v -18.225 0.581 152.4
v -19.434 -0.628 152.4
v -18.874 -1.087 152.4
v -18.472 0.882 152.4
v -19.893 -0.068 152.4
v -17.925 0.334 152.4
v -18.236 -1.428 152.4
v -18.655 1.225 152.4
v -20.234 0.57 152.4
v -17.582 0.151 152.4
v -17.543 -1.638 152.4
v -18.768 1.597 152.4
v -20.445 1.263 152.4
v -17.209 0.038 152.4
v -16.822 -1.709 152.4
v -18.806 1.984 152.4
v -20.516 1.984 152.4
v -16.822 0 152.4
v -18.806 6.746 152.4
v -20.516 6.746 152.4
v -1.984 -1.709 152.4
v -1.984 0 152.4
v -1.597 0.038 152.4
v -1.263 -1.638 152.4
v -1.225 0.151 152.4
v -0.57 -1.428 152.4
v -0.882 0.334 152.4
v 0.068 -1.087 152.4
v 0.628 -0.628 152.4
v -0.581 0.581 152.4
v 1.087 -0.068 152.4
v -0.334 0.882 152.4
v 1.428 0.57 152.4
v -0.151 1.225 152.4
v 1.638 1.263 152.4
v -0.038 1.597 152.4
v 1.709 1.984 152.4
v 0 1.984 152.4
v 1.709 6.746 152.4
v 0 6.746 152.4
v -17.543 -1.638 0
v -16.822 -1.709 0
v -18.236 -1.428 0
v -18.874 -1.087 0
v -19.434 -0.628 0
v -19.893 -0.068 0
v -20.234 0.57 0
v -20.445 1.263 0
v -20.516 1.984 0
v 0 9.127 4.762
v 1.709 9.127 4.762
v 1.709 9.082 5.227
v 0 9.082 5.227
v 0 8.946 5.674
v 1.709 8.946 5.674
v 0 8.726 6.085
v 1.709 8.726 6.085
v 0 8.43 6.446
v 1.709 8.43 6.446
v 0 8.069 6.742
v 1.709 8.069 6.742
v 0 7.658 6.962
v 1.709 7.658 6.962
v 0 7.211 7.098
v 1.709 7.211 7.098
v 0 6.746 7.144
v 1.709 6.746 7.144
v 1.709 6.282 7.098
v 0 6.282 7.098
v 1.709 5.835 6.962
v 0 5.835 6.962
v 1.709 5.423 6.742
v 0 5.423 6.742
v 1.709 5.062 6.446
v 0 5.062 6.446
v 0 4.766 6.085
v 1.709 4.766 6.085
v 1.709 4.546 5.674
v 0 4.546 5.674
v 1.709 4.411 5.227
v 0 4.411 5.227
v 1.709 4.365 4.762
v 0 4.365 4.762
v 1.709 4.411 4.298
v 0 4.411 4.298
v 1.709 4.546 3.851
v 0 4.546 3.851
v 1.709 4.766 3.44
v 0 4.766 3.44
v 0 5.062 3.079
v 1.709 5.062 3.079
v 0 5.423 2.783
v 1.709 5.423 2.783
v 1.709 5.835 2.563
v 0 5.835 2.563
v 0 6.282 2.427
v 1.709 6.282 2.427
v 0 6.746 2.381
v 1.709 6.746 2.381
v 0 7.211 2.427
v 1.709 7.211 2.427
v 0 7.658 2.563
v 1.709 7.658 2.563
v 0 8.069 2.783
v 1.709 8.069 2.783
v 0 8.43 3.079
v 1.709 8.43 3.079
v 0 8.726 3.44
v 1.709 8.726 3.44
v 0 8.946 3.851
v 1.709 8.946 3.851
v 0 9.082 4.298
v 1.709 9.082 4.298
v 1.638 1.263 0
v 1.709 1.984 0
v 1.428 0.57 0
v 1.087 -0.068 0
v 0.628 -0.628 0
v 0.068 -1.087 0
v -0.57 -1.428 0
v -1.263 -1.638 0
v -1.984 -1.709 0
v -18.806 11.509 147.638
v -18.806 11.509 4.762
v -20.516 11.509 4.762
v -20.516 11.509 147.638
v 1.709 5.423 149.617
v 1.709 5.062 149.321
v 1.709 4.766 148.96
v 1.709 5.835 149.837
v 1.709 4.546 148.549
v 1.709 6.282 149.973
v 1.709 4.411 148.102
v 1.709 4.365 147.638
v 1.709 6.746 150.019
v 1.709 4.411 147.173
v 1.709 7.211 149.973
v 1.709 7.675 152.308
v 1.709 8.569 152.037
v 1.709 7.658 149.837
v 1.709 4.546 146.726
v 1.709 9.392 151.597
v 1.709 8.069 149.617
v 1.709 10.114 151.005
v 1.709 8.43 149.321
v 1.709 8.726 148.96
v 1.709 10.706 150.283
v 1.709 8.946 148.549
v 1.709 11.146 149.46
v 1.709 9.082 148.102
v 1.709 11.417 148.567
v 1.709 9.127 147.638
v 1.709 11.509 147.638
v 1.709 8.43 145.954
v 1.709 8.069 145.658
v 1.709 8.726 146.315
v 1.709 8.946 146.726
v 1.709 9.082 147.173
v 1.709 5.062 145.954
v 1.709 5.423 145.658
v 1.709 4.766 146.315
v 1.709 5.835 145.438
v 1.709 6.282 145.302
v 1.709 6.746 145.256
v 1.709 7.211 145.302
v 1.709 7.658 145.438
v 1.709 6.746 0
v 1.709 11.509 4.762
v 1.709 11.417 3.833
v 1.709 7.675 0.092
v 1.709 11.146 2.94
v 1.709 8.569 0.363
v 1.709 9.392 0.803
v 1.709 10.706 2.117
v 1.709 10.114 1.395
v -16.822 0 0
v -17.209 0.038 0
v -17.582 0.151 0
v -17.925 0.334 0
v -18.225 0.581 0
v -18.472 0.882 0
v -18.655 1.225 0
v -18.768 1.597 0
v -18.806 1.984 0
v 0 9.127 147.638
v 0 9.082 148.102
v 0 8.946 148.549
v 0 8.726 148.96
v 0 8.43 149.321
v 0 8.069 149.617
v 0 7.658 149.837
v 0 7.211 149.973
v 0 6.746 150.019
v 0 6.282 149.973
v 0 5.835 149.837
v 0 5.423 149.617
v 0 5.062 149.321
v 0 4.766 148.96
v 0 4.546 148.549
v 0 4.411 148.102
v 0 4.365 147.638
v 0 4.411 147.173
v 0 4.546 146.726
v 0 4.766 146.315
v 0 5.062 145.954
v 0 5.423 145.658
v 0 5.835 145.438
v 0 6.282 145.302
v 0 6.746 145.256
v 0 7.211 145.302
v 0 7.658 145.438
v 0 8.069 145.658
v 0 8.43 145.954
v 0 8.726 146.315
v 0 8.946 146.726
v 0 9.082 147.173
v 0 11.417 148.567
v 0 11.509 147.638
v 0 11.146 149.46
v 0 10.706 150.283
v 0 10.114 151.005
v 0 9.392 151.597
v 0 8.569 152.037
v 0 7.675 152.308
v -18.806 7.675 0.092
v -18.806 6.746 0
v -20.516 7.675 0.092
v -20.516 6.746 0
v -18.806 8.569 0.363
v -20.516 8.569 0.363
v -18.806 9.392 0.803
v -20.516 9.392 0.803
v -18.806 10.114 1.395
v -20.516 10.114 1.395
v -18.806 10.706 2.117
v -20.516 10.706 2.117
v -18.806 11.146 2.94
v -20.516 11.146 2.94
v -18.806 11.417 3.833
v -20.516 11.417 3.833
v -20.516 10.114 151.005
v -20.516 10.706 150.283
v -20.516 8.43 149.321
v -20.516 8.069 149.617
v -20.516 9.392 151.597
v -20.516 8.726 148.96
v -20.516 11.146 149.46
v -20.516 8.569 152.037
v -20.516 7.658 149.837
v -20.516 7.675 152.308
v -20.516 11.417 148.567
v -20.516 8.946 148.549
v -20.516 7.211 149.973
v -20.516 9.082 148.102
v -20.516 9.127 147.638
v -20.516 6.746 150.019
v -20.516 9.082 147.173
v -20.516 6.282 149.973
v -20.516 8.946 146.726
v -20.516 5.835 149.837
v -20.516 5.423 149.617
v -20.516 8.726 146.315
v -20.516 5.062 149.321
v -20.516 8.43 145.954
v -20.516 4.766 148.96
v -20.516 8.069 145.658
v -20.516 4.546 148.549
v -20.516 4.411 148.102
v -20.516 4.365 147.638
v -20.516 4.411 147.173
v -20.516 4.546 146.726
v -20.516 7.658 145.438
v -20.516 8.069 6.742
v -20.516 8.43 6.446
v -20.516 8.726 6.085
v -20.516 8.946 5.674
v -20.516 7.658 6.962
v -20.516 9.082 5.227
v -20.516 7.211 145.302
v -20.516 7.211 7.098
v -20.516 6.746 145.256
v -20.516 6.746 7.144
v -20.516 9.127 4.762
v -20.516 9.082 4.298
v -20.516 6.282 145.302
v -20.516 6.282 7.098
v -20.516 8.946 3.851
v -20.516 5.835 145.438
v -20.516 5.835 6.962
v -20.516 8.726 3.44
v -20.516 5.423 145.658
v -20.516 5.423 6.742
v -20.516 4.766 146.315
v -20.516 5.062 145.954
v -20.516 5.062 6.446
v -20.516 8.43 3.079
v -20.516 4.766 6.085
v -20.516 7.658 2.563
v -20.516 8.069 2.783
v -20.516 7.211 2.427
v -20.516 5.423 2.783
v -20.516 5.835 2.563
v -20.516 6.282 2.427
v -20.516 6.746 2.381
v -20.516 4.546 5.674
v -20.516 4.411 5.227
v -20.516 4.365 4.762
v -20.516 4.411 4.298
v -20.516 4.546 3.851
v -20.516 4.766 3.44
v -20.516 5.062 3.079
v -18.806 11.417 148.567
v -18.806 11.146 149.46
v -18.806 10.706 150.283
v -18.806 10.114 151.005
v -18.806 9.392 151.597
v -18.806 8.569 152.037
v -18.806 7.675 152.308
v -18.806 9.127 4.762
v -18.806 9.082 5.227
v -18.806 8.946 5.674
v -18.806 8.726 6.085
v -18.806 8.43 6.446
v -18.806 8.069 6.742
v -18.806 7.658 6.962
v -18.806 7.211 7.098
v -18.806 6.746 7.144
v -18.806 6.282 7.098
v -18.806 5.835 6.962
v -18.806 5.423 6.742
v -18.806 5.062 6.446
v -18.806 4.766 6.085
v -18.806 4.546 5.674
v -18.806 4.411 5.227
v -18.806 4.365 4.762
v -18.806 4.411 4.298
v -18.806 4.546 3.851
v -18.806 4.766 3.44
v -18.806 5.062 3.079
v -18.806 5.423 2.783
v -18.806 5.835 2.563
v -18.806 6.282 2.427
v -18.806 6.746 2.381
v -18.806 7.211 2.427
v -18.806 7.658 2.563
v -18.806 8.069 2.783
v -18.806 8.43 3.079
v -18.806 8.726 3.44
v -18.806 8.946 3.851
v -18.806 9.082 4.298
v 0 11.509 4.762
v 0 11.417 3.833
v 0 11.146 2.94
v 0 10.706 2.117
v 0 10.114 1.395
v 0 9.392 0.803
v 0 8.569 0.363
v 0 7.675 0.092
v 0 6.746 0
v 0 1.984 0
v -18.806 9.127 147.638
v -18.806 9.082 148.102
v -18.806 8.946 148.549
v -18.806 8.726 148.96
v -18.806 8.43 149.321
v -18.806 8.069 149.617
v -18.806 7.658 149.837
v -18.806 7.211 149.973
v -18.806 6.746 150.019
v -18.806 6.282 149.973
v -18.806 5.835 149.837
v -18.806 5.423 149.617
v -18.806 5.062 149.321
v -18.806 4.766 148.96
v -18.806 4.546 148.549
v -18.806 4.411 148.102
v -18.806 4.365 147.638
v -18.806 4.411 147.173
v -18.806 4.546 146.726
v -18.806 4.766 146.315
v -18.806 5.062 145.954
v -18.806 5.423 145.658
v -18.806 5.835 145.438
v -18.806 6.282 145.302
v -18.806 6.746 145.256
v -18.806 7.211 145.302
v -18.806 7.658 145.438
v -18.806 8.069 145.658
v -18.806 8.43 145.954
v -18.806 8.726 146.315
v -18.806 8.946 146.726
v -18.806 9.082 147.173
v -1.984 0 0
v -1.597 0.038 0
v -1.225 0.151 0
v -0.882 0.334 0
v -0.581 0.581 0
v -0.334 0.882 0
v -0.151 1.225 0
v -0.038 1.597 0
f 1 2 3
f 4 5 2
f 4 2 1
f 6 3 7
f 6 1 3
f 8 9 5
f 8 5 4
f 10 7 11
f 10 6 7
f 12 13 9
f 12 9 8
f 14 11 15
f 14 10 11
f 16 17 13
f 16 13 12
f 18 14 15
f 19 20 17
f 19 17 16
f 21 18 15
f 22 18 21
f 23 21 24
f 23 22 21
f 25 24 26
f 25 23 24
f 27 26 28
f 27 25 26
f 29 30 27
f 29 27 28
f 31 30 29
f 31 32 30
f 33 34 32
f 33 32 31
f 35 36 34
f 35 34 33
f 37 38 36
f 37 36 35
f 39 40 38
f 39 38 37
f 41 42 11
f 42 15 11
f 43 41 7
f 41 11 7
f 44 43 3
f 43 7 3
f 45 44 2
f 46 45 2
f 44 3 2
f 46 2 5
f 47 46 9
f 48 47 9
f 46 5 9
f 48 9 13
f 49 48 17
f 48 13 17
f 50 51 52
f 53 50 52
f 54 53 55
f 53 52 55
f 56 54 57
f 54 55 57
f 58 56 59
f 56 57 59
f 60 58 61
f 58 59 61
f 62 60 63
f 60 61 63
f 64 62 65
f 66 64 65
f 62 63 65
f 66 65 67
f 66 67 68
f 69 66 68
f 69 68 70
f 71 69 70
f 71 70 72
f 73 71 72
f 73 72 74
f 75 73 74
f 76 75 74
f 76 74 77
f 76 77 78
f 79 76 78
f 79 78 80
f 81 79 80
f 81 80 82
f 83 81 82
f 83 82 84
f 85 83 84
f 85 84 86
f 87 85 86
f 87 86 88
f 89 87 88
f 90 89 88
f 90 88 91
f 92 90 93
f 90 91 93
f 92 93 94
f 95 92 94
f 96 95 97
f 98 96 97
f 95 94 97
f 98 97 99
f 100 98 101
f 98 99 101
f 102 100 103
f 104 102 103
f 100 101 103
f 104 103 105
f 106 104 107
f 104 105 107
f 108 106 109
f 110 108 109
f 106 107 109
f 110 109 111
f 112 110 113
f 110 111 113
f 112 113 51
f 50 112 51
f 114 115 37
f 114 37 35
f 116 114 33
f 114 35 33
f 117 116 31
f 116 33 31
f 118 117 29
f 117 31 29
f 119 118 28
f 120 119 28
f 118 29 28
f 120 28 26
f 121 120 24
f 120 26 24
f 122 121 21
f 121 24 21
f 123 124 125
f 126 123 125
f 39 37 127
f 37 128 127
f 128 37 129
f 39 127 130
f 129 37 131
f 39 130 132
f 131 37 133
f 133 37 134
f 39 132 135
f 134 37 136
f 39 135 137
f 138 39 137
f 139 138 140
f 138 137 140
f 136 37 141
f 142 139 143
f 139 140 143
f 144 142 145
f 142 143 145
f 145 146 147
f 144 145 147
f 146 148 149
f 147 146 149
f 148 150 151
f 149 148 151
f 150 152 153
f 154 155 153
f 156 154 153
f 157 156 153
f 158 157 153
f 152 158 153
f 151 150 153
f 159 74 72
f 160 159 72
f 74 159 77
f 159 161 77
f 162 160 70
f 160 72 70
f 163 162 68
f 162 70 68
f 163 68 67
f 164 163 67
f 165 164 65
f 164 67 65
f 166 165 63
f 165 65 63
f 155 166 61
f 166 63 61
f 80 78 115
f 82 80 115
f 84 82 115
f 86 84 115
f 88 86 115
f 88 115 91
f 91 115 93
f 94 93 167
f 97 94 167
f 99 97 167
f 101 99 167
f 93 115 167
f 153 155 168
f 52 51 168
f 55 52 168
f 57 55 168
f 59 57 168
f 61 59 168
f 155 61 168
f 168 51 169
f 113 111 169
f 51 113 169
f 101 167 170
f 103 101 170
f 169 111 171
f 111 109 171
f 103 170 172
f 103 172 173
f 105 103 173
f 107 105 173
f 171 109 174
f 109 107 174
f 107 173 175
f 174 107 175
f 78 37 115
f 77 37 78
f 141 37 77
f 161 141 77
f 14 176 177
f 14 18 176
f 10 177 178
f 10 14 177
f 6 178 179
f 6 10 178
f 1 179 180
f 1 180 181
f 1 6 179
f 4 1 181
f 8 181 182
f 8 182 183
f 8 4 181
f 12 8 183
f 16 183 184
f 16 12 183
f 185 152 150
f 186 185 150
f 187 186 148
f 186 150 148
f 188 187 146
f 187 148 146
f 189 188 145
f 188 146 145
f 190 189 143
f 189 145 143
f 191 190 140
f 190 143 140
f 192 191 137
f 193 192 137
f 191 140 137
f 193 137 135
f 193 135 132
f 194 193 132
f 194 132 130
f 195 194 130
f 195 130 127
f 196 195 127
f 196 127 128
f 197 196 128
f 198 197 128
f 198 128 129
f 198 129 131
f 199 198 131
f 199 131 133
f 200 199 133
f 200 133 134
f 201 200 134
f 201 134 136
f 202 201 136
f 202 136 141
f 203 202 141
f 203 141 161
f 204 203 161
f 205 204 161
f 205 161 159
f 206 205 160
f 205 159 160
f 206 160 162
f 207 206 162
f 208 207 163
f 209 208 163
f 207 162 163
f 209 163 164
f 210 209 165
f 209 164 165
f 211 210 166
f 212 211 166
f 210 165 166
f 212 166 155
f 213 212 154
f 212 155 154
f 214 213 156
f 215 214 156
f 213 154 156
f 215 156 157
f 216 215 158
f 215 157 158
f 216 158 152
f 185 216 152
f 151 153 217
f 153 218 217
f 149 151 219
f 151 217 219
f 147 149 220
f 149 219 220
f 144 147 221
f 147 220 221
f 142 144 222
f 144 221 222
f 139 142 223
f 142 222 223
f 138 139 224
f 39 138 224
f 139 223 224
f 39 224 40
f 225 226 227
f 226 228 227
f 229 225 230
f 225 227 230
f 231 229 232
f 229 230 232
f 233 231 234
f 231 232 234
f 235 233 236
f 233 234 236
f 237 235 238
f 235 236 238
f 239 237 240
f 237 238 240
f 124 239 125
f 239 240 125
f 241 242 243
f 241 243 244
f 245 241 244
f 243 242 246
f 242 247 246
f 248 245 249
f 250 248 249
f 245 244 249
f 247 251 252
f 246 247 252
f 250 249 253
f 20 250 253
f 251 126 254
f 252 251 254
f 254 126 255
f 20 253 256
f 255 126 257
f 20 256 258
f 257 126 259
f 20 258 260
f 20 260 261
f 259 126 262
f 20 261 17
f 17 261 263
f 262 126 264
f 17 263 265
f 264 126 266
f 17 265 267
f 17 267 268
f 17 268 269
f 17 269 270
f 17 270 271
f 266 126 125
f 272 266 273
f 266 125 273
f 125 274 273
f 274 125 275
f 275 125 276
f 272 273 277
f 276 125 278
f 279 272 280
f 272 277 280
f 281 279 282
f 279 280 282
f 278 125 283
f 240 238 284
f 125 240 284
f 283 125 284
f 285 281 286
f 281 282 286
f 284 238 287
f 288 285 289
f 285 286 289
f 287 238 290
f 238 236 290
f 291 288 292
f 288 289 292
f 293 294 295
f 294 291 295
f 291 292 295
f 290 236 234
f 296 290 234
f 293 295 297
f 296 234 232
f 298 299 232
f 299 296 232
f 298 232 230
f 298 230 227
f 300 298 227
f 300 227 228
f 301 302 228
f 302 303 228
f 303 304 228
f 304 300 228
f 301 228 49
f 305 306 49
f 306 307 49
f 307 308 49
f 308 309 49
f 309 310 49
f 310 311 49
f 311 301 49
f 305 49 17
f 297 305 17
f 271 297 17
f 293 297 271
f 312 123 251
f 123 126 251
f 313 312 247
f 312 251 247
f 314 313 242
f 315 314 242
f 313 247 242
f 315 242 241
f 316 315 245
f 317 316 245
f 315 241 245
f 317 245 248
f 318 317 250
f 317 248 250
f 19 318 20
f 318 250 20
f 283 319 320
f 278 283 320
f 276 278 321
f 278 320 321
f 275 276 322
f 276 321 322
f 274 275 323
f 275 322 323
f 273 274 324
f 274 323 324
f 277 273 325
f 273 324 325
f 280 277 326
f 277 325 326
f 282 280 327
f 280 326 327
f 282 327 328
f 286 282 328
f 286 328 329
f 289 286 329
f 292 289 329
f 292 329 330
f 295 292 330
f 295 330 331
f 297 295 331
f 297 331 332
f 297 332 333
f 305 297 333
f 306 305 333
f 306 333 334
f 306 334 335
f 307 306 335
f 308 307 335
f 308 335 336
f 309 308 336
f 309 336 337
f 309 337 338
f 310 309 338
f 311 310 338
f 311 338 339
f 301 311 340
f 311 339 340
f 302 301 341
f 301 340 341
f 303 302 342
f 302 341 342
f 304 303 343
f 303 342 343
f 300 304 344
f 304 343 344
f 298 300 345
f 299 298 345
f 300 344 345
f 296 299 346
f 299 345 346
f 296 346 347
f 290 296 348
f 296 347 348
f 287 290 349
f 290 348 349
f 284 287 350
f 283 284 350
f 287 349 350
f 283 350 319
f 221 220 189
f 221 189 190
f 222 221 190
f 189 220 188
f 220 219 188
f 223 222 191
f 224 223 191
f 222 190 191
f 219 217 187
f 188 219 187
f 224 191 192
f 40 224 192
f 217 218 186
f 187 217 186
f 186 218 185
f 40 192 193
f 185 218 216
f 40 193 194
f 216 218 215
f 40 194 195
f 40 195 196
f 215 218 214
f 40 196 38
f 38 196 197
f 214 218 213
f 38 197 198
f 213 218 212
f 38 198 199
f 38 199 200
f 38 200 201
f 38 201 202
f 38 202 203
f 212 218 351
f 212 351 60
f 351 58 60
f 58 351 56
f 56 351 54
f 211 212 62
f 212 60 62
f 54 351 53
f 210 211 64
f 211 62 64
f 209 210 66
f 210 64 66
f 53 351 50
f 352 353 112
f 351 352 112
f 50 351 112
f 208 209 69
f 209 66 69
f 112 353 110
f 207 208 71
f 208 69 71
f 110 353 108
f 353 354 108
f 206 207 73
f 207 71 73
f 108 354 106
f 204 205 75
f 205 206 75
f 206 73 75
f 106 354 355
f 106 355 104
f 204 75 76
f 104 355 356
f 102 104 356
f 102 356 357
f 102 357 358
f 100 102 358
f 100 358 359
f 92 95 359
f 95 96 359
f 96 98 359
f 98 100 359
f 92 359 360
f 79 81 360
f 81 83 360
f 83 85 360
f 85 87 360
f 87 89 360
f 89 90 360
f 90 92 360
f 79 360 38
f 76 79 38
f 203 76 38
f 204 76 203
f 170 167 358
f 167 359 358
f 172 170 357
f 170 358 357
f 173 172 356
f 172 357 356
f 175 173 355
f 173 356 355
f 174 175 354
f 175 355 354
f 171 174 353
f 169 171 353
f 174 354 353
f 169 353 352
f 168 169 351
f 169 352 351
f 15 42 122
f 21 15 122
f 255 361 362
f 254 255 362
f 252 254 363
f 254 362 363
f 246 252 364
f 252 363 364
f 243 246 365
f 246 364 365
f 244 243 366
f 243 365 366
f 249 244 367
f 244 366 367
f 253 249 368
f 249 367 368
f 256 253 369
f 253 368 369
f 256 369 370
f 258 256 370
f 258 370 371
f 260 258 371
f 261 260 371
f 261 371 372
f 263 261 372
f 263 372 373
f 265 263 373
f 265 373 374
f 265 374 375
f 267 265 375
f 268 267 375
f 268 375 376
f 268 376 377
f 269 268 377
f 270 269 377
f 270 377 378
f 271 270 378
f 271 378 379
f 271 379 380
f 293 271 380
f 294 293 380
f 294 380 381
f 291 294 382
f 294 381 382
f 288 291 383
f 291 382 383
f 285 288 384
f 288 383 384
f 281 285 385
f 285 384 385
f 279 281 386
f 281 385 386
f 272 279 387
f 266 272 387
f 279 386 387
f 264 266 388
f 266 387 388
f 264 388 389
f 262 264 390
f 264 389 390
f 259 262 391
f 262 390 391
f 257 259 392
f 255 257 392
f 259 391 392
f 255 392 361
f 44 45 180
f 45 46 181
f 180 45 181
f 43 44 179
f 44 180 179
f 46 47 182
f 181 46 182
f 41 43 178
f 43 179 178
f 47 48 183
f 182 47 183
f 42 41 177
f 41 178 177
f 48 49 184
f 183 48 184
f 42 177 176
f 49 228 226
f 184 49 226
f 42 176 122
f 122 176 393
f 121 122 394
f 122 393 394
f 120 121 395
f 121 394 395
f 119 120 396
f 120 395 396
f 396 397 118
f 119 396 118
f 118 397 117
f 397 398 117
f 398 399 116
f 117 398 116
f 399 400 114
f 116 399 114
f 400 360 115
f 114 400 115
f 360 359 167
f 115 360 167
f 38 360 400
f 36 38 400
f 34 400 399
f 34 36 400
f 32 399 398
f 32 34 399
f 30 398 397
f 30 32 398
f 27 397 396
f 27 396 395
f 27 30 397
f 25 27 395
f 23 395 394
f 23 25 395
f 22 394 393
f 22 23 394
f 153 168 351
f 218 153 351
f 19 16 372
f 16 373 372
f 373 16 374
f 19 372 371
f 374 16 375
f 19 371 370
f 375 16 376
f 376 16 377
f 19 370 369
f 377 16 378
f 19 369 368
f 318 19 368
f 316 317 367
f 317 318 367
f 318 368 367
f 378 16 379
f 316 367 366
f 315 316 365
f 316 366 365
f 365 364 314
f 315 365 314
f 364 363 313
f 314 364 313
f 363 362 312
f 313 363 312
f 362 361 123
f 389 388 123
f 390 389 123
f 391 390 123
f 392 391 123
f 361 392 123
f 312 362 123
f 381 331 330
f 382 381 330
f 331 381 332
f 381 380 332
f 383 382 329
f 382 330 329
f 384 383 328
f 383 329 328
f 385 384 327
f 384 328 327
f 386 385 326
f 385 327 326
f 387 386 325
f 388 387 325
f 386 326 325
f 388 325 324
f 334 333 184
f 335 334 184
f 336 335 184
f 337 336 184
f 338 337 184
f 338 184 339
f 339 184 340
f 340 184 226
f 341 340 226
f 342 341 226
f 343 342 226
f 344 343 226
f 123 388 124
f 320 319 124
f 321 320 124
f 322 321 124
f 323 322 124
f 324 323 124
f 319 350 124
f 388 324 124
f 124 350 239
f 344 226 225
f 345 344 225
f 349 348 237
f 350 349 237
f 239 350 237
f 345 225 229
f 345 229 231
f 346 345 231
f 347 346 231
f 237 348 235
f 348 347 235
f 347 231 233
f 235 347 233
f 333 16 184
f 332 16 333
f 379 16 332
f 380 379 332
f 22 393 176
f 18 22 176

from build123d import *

# Parameters (mm, degrees)
F1_DEPTH = 152.4
F2_R     = 1.98374
F3_R     = 3.69316
F4_R     = 4.7625
F5_R     = 2.38125
F6_DEPTH = 22.225


with BuildPart() as f1:
    # F0 (on Top) → F1 (new body)
    with BuildSketch(Plane.XY):
        Polygon((0, 11.50874), (0, 0), (-18.80616, 0), (-18.80616, 11.50874), (-20.51558, 11.50874), (-20.51558, -1.70942), (1.70942, -1.70942), (1.70942, 11.50874), align=None)
    extrude(amount=F1_DEPTH)

    # F2
    f2_edges = [f1.edges().sort_by_distance(p)[0] for p in [
        (0, 0, 76.2),
        (-18.80616, 0, 76.2),
    ]]
    fillet(f2_edges, radius=F2_R)

    # F3
    f3_edges = [f1.edges().sort_by_distance(p)[0] for p in [
        (1.70942, -1.70942, 76.2),
        (-20.51558, -1.70942, 76.2),
    ]]
    fillet(f3_edges, radius=F3_R)

    # F4
    f4_edges = [f1.edges().sort_by_distance(p)[0] for p in [
        (0.85471, 11.50874, 152.4),
        (-19.66087, 11.50874, 152.4),
        (-19.66087, 11.50874, 0),
        (0.85471, 11.50874, 0),
    ]]
    fillet(f4_edges, radius=F4_R)

    # F5 (on face) → F6 (cut, through all)
    with BuildSketch(Plane.YZ.offset(1.70942)):
        with Locations((6.74624, 4.7625)):
            Circle(F5_R)
        with Locations((6.74624, 147.6375)):
            Circle(F5_R)
    extrude(amount=-F6_DEPTH, mode=Mode.SUBTRACT)


solid = f1.part
